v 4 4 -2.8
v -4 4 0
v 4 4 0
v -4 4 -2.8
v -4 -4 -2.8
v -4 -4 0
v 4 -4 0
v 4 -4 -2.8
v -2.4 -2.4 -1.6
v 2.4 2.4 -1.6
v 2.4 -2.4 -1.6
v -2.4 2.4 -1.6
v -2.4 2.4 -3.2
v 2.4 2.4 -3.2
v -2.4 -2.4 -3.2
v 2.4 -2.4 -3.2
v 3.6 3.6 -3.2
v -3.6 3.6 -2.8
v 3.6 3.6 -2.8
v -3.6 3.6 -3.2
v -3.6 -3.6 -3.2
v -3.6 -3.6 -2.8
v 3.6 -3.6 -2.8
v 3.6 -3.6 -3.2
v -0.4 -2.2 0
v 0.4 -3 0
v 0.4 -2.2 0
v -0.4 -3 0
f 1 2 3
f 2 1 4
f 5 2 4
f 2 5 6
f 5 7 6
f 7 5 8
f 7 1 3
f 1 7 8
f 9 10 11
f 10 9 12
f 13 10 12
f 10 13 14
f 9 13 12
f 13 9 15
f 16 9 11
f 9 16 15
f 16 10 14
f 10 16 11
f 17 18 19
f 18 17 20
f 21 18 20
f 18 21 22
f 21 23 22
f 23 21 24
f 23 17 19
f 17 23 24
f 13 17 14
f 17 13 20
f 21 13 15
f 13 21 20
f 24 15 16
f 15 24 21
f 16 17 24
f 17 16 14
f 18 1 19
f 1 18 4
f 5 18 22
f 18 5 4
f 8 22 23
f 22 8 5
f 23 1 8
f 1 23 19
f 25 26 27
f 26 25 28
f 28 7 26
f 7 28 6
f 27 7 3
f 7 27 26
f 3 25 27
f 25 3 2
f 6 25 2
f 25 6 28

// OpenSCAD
// file: ../p/4-4edge.scad
use <../lib.scad>
$fa=1; $fs=0.2;
function ldraw_lib__4_4edge(realsolid=false) = [
// 0 Circle 1.0
// 0 Name: 4-4edge.dat
// 0 Author: James Jessiman
// 0 !LDRAW_ORG Primitive UPDATE 2017-01
// 0 !LICENSE Licensed under CC BY 2.0 and CC BY 4.0 : see CAreadme.txt
// 
// 0 BFC CERTIFY CCW
  [0,"BFC","CERTIFY"],
  [0,"BFC","CCW"],
// 
// 0 !HISTORY 1998-12-15 [PTadmin] Official Update 1998-10
// 0 !HISTORY 2005-12-28 [PTadmin] Official Update 2005-01
// 0 !HISTORY 2007-06-24 [PTadmin] Header formatted for Contributor Agreement
// 0 !HISTORY 2008-07-01 [PTadmin] Official Update 2008-01
// 0 !HISTORY 2017-01-15 [Steffen] BFCed
// 0 !HISTORY 2017-12-30 [PTadmin] Official Update 2017-01
// 
// 
// 2 24 1 0 0 0.9239 0 0.3827
  [2,24,1,0,0,0.9239,0,0.3827],
// 2 24 0.9239 0 0.3827 0.7071 0 0.7071
  [2,24,0.9239,0,0.3827,0.7071,0,0.7071],
// 2 24 0.7071 0 0.7071 0.3827 0 0.9239
  [2,24,0.7071,0,0.7071,0.3827,0,0.9239],
// 2 24 0.3827 0 0.9239 0 0 1
  [2,24,0.3827,0,0.9239,0,0,1],
// 2 24 0 0 1 -0.3827 0 0.9239
  [2,24,0,0,1,-0.3827,0,0.9239],
// 2 24 -0.3827 0 0.9239 -0.7071 0 0.7071
  [2,24,-0.3827,0,0.9239,-0.7071,0,0.7071],
// 2 24 -0.7071 0 0.7071 -0.9239 0 0.3827
  [2,24,-0.7071,0,0.7071,-0.9239,0,0.3827],
// 2 24 -0.9239 0 0.3827 -1 0 -0
  [2,24,-0.9239,0,0.3827,-1,0,-0],
// 2 24 -1 0 -0 -0.9239 0 -0.3827
  [2,24,-1,0,-0,-0.9239,0,-0.3827],
// 2 24 -0.9239 0 -0.3827 -0.7071 0 -0.7071
  [2,24,-0.9239,0,-0.3827,-0.7071,0,-0.7071],
// 2 24 -0.7071 0 -0.7071 -0.3827 0 -0.9239
  [2,24,-0.7071,0,-0.7071,-0.3827,0,-0.9239],
// 2 24 -0.3827 0 -0.9239 0 0 -1
  [2,24,-0.3827,0,-0.9239,0,0,-1],
// 2 24 0 0 -1 0.3827 0 -0.9239
  [2,24,0,0,-1,0.3827,0,-0.9239],
// 2 24 0.3827 0 -0.9239 0.7071 0 -0.7071
  [2,24,0.3827,0,-0.9239,0.7071,0,-0.7071],
// 2 24 0.7071 0 -0.7071 0.9239 0 -0.3827
  [2,24,0.7071,0,-0.7071,0.9239,0,-0.3827],
// 2 24 0.9239 0 -0.3827 1 0 0
  [2,24,0.9239,0,-0.3827,1,0,0],
];
module ldraw_lib__4_4edge(step=0, col=false, unit=2/5, alt=false, line=0.2, solid=!$preview)
    makepoly(ldraw_lib__4_4edge(solid), step=step, col=col, unit=unit, alt=alt, line=line, solid=solid);
ldraw_lib__4_4edge(line=0.2);
// file: ../p/4-4disc.scad
use <../lib.scad>
$fa=1; $fs=0.2;
function ldraw_lib__4_4disc(realsolid=false) = [
// 0 Disc 1.0
// 0 Name: 4-4disc.dat
// 0 Author: James Jessiman
// 0 !LDRAW_ORG Primitive UPDATE 2002-02
// 0 !LICENSE Licensed under CC BY 2.0 and CC BY 4.0 : see CAreadme.txt
// 
// 0 BFC CERTIFY CCW
  [0,"BFC","CERTIFY"],
  [0,"BFC","CCW"],
// 
// 0 !HISTORY 1998-12-15 [PTadmin] Official Update 1998-10
// 0 !HISTORY 2002-03-23 [sbliss] Added BFC statement
// 0 !HISTORY 2002-04-25 [PTadmin] Official Update 2002-02
// 0 !HISTORY 2007-06-24 [PTadmin] Header formatted for Contributor Agreement
// 0 !HISTORY 2008-07-01 [PTadmin] Official Update 2008-01
// 
// 
// 3 16 0 0 0 1 0 0 0.9239 0 0.3827
  [3,16,0,0,0,1,0,0,0.9239,0,0.3827],
// 3 16 0 0 0 0.9239 0 0.3827 0.7071 0 0.7071
  [3,16,0,0,0,0.9239,0,0.3827,0.7071,0,0.7071],
// 3 16 0 0 0 0.7071 0 0.7071 0.3827 0 0.9239
  [3,16,0,0,0,0.7071,0,0.7071,0.3827,0,0.9239],
// 3 16 0 0 0 0.3827 0 0.9239 0 0 1
  [3,16,0,0,0,0.3827,0,0.9239,0,0,1],
// 3 16 0 0 0 0 0 1 -0.3827 0 0.9239
  [3,16,0,0,0,0,0,1,-0.3827,0,0.9239],
// 3 16 0 0 0 -0.3827 0 0.9239 -0.7071 0 0.7071
  [3,16,0,0,0,-0.3827,0,0.9239,-0.7071,0,0.7071],
// 3 16 0 0 0 -0.7071 0 0.7071 -0.9239 0 0.3827
  [3,16,0,0,0,-0.7071,0,0.7071,-0.9239,0,0.3827],
// 3 16 0 0 0 -0.9239 0 0.3827 -1 0 -0
  [3,16,0,0,0,-0.9239,0,0.3827,-1,0,-0],
// 3 16 0 0 0 -1 0 -0 -0.9239 0 -0.3827
  [3,16,0,0,0,-1,0,-0,-0.9239,0,-0.3827],
// 3 16 0 0 0 -0.9239 0 -0.3827 -0.7071 0 -0.7071
  [3,16,0,0,0,-0.9239,0,-0.3827,-0.7071,0,-0.7071],
// 3 16 0 0 0 -0.7071 0 -0.7071 -0.3827 0 -0.9239
  [3,16,0,0,0,-0.7071,0,-0.7071,-0.3827,0,-0.9239],
// 3 16 0 0 0 -0.3827 0 -0.9239 0 0 -1
  [3,16,0,0,0,-0.3827,0,-0.9239,0,0,-1],
// 3 16 0 0 0 0 0 -1 0.3827 0 -0.9239
  [3,16,0,0,0,0,0,-1,0.3827,0,-0.9239],
// 3 16 0 0 0 0.3827 0 -0.9239 0.7071 0 -0.7071
  [3,16,0,0,0,0.3827,0,-0.9239,0.7071,0,-0.7071],
// 3 16 0 0 0 0.7071 0 -0.7071 0.9239 0 -0.3827
  [3,16,0,0,0,0.7071,0,-0.7071,0.9239,0,-0.3827],
// 3 16 0 0 0 0.9239 0 -0.3827 1 0 0
  [3,16,0,0,0,0.9239,0,-0.3827,1,0,0],
// 0
];
module ldraw_lib__4_4disc(step=0, col=false, unit=2/5, alt=false, line=0.2, solid=!$preview)
    makepoly(ldraw_lib__4_4disc(solid), step=step, col=col, unit=unit, alt=alt, line=line, solid=solid);
ldraw_lib__4_4disc(line=0.2);
// file: ../p/4-4cyli.scad
use <../lib.scad>
$fa=1; $fs=0.2;
function ldraw_lib__4_4cyli(realsolid=false) = [
// 0 Cylinder 1.0
// 0 Name: 4-4cyli.dat
// 0 Author: James Jessiman
// 0 !LDRAW_ORG Primitive UPDATE 2005-01
// 0 !LICENSE Licensed under CC BY 2.0 and CC BY 4.0 : see CAreadme.txt
// 
// 0 BFC CERTIFY CCW
  [0,"BFC","CERTIFY"],
  [0,"BFC","CCW"],
// 
// 0 !HISTORY 1998-12-15 [PTadmin] Official Update 1998-10
// 0 !HISTORY 2002-03-23 [sbliss] Added BFC statement; merged headers from files in distributions LDraw 0.27 and Complete.
// 0 !HISTORY 2002-04-25 [PTadmin] Official Update 2002-02
// 0 !HISTORY 2004-12-14 [guyvivan] BFC CCW
// 0 !HISTORY 2005-12-28 [PTadmin] Official Update 2005-01
// 0 !HISTORY 2007-06-24 [PTadmin] Header formatted for Contributor Agreement
// 0 !HISTORY 2008-07-01 [PTadmin] Official Update 2008-01
// 
// 
// 4 16 1 1 0 0.9239 1 0.3827 0.9239 0 0.3827 1 0 0
  [4,16,1,1,0,0.9239,1,0.3827,0.9239,0,0.3827,1,0,0],
// 5 24 1 0 0 1 1 0 0.9239 0 0.3827 0.9239 0 -0.3827
  [5,24,1,0,0,1,1,0,0.9239,0,0.3827,0.9239,0,-0.3827],
// 4 16 0.9239 1 0.3827 0.7071 1 0.7071 0.7071 0 0.7071 0.9239 0 0.3827
  [4,16,0.9239,1,0.3827,0.7071,1,0.7071,0.7071,0,0.7071,0.9239,0,0.3827],
// 5 24 0.9239 0 0.3827 0.9239 1 0.3827 0.7071 0 0.7071 1 0 0
  [5,24,0.9239,0,0.3827,0.9239,1,0.3827,0.7071,0,0.7071,1,0,0],
// 4 16 0.7071 1 0.7071 0.3827 1 0.9239 0.3827 0 0.9239 0.7071 0 0.7071
  [4,16,0.7071,1,0.7071,0.3827,1,0.9239,0.3827,0,0.9239,0.7071,0,0.7071],
// 5 24 0.7071 0 0.7071 0.7071 1 0.7071 0.3827 0 0.9239 0.9239 0 0.3827
  [5,24,0.7071,0,0.7071,0.7071,1,0.7071,0.3827,0,0.9239,0.9239,0,0.3827],
// 4 16 0.3827 1 0.9239 0 1 1 0 0 1 0.3827 0 0.9239
  [4,16,0.3827,1,0.9239,0,1,1,0,0,1,0.3827,0,0.9239],
// 5 24 0.3827 0 0.9239 0.3827 1 0.9239 0 0 1 0.7071 0 0.7071
  [5,24,0.3827,0,0.9239,0.3827,1,0.9239,0,0,1,0.7071,0,0.7071],
// 4 16 0 1 1 -0.3827 1 0.9239 -0.3827 0 0.9239 0 0 1
  [4,16,0,1,1,-0.3827,1,0.9239,-0.3827,0,0.9239,0,0,1],
// 5 24 0 0 1 0 1 1 -0.3827 0 0.9239 0.3827 0 0.9239
  [5,24,0,0,1,0,1,1,-0.3827,0,0.9239,0.3827,0,0.9239],
// 4 16 -0.3827 1 0.9239 -0.7071 1 0.7071 -0.7071 0 0.7071 -0.3827 0 0.9239
  [4,16,-0.3827,1,0.9239,-0.7071,1,0.7071,-0.7071,0,0.7071,-0.3827,0,0.9239],
// 5 24 -0.3827 0 0.9239 -0.3827 1 0.9239 -0.7071 0 0.7071 0 0 1
  [5,24,-0.3827,0,0.9239,-0.3827,1,0.9239,-0.7071,0,0.7071,0,0,1],
// 4 16 -0.7071 1 0.7071 -0.9239 1 0.3827 -0.9239 0 0.3827 -0.7071 0 0.7071
  [4,16,-0.7071,1,0.7071,-0.9239,1,0.3827,-0.9239,0,0.3827,-0.7071,0,0.7071],
// 5 24 -0.7071 0 0.7071 -0.7071 1 0.7071 -0.9239 0 0.3827 -0.3827 0 0.9239
  [5,24,-0.7071,0,0.7071,-0.7071,1,0.7071,-0.9239,0,0.3827,-0.3827,0,0.9239],
// 4 16 -0.9239 1 0.3827 -1 1 0 -1 0 0 -0.9239 0 0.3827
  [4,16,-0.9239,1,0.3827,-1,1,0,-1,0,0,-0.9239,0,0.3827],
// 5 24 -0.9239 0 0.3827 -0.9239 1 0.3827 -1 0 0 -0.7071 0 0.7071
  [5,24,-0.9239,0,0.3827,-0.9239,1,0.3827,-1,0,0,-0.7071,0,0.7071],
// 4 16 -1 1 0 -0.9239 1 -0.3827 -0.9239 0 -0.3827 -1 0 0
  [4,16,-1,1,0,-0.9239,1,-0.3827,-0.9239,0,-0.3827,-1,0,0],
// 5 24 -1 0 0 -1 1 0 -0.9239 0 -0.3827 -0.9239 0 0.3827
  [5,24,-1,0,0,-1,1,0,-0.9239,0,-0.3827,-0.9239,0,0.3827],
// 4 16 -0.9239 1 -0.3827 -0.7071 1 -0.7071 -0.7071 0 -0.7071 -0.9239 0 -0.3827
  [4,16,-0.9239,1,-0.3827,-0.7071,1,-0.7071,-0.7071,0,-0.7071,-0.9239,0,-0.3827],
// 5 24 -0.9239 0 -0.3827 -0.9239 1 -0.3827 -0.7071 0 -0.7071 -1 0 0
  [5,24,-0.9239,0,-0.3827,-0.9239,1,-0.3827,-0.7071,0,-0.7071,-1,0,0],
// 4 16 -0.7071 1 -0.7071 -0.3827 1 -0.9239 -0.3827 0 -0.9239 -0.7071 0 -0.7071
  [4,16,-0.7071,1,-0.7071,-0.3827,1,-0.9239,-0.3827,0,-0.9239,-0.7071,0,-0.7071],
// 5 24 -0.7071 0 -0.7071 -0.7071 1 -0.7071 -0.3827 0 -0.9239 -0.9239 0 -0.3827
  [5,24,-0.7071,0,-0.7071,-0.7071,1,-0.7071,-0.3827,0,-0.9239,-0.9239,0,-0.3827],
// 4 16 -0.3827 1 -0.9239 0 1 -1 0 0 -1 -0.3827 0 -0.9239
  [4,16,-0.3827,1,-0.9239,0,1,-1,0,0,-1,-0.3827,0,-0.9239],
// 5 24 -0.3827 0 -0.9239 -0.3827 1 -0.9239 0 0 -1 -0.7071 0 -0.7071
  [5,24,-0.3827,0,-0.9239,-0.3827,1,-0.9239,0,0,-1,-0.7071,0,-0.7071],
// 4 16 0 1 -1 0.3827 1 -0.9239 0.3827 0 -0.9239 0 0 -1
  [4,16,0,1,-1,0.3827,1,-0.9239,0.3827,0,-0.9239,0,0,-1],
// 5 24 0 0 -1 0 1 -1 0.3827 0 -0.9239 -0.3827 0 -0.9239
  [5,24,0,0,-1,0,1,-1,0.3827,0,-0.9239,-0.3827,0,-0.9239],
// 4 16 0.3827 1 -0.9239 0.7071 1 -0.7071 0.7071 0 -0.7071 0.3827 0 -0.9239
  [4,16,0.3827,1,-0.9239,0.7071,1,-0.7071,0.7071,0,-0.7071,0.3827,0,-0.9239],
// 5 24 0.3827 0 -0.9239 0.3827 1 -0.9239 0.7071 0 -0.7071 0 0 -1
  [5,24,0.3827,0,-0.9239,0.3827,1,-0.9239,0.7071,0,-0.7071,0,0,-1],
// 4 16 0.7071 1 -0.7071 0.9239 1 -0.3827 0.9239 0 -0.3827 0.7071 0 -0.7071
  [4,16,0.7071,1,-0.7071,0.9239,1,-0.3827,0.9239,0,-0.3827,0.7071,0,-0.7071],
// 5 24 0.7071 0 -0.7071 0.7071 1 -0.7071 0.9239 0 -0.3827 0.3827 0 -0.9239
  [5,24,0.7071,0,-0.7071,0.7071,1,-0.7071,0.9239,0,-0.3827,0.3827,0,-0.9239],
// 4 16 0.9239 1 -0.3827 1 1 0 1 0 0 0.9239 0 -0.3827
  [4,16,0.9239,1,-0.3827,1,1,0,1,0,0,0.9239,0,-0.3827],
// 5 24 0.9239 0 -0.3827 0.9239 1 -0.3827 1 0 0 0.7071 0 -0.7071
  [5,24,0.9239,0,-0.3827,0.9239,1,-0.3827,1,0,0,0.7071,0,-0.7071],
// 0
];
module ldraw_lib__4_4cyli(step=0, col=false, unit=2/5, alt=false, line=0.2, solid=!$preview)
    makepoly(ldraw_lib__4_4cyli(solid), step=step, col=col, unit=unit, alt=alt, line=line, solid=solid);
ldraw_lib__4_4cyli(line=0.2);
// file: ../p/stud3.scad
use <../lib.scad>
use <4-4cyli.scad>
use <4-4disc.scad>
use <4-4edge.scad>
$fa=1; $fs=0.2;
function ldraw_lib__stud3(realsolid=false) = realsolid ? 
    [openscad(translate([0,0,-eps()], o=cylinder(4+eps(), r=4)),2)] : [
// 0 Stud Tube Solid
// 0 Name: stud3.dat
// 0 Author: James Jessiman
// 0 !LDRAW_ORG Primitive UPDATE 2012-01
// 0 !LICENSE Licensed under CC BY 2.0 and CC BY 4.0 : see CAreadme.txt
// 
// 0 BFC CERTIFY CCW
  [0,"BFC","CERTIFY"],
  [0,"BFC","CCW"],
// 
// 0 !HISTORY 2002-04-04 [sbliss] Modified for BFC compliance
// 0 !HISTORY 2002-04-25 [PTadmin] Official Update 2002-02
// 0 !HISTORY 2007-06-24 [PTadmin] Header formatted for Contributor Agreement
// 0 !HISTORY 2008-07-01 [PTadmin] Official Update 2008-01
// 0 !HISTORY 2012-02-16 [Philo] Changed to CCW
// 0 !HISTORY 2012-03-30 [PTadmin] Official Update 2012-01
// 
// 
// 1 16 0 -4 0 4 0 0 0 1 0 0 0 4 4-4edge.dat
  [1,16,0,-4,0,4,0,0,0,1,0,0,0,4, ldraw_lib__4_4edge(realsolid)],
// 1 16 0 0 0 4 0 0 0 1 0 0 0 4 4-4edge.dat
  [1,16,0,0,0,4,0,0,0,1,0,0,0,4, ldraw_lib__4_4edge(realsolid)],
// 1 16 0 -4 0 4 0 0 0 1 0 0 0 4 4-4disc.dat
  [1,16,0,-4,0,4,0,0,0,1,0,0,0,4, ldraw_lib__4_4disc(realsolid)],
// 1 16 0 -4 0 4 0 0 0 4 0 0 0 4 4-4cyli.dat
  [1,16,0,-4,0,4,0,0,0,4,0,0,0,4, ldraw_lib__4_4cyli(realsolid)],
];
module ldraw_lib__stud3(step=0, col=false, unit=2/5, alt=false, line=0.2, solid=!$preview)
    makepoly(ldraw_lib__stud3(solid), step=step, col=col, unit=unit, alt=alt, line=line, solid=solid);
ldraw_lib__stud3(line=0.2);
// file: ../p/stud.scad
use <../lib.scad>
use <4-4cyli.scad>
use <4-4disc.scad>
use <4-4edge.scad>
$fa=1; $fs=0.2;
function ldraw_lib__stud(realsolid=false) = realsolid ? 
    [openscad(translate([0,0,-eps()], o=cylinder(4+eps(), r=6)),2)] : [
// 0 Stud
// 0 Name: stud.dat
// 0 Author: James Jessiman
// 0 !LDRAW_ORG Primitive UPDATE 2012-01
// 0 !LICENSE Licensed under CC BY 2.0 and CC BY 4.0 : see CAreadme.txt
// 
// 0 BFC CERTIFY CCW
  [0,"BFC","CERTIFY"],
  [0,"BFC","CCW"],
// 
// 0 !HISTORY 2002-04-04 [sbliss] Modified for BFC compliance
// 0 !HISTORY 2002-04-25 [PTadmin] Official Update 2002-02
// 0 !HISTORY 2007-06-24 [PTadmin] Header formatted for Contributor Agreement
// 0 !HISTORY 2008-07-01 [PTadmin] Official Update 2008-01
// 0 !HISTORY 2012-02-16 [Philo] Changed to CCW
// 0 !HISTORY 2012-03-30 [PTadmin] Official Update 2012-01
// 
// 
// 1 16 0 0 0 6 0 0 0 1 0 0 0 6 4-4edge.dat
  [1,16,0,0,0,6,0,0,0,1,0,0,0,6, ldraw_lib__4_4edge(realsolid)],
// 1 16 0 -4 0 6 0 0 0 1 0 0 0 6 4-4edge.dat
  [1,16,0,-4,0,6,0,0,0,1,0,0,0,6, ldraw_lib__4_4edge(realsolid)],
// 1 16 0 0 0 6 0 0 0 -4 0 0 0 6 4-4cyli.dat
  [1,16,0,0,0,6,0,0,0,-4,0,0,0,6, ldraw_lib__4_4cyli(realsolid)],
// 1 16 0 -4 0 6 0 0 0 1 0 0 0 6 4-4disc.dat
  [1,16,0,-4,0,6,0,0,0,1,0,0,0,6, ldraw_lib__4_4disc(realsolid)],
];
module ldraw_lib__stud(step=0, col=false, unit=2/5, alt=false, line=0.2, solid=!$preview)
    makepoly(ldraw_lib__stud(solid), step=step, col=col, unit=unit, alt=alt, line=line, solid=solid);
ldraw_lib__stud(line=0.2);
// file: ../p/box4t.scad
use <../lib.scad>
$fa=1; $fs=0.2;
function ldraw_lib__box4t(realsolid=false) = [
// 0 Box with 4 Adjacent Faces and All Edges
// 0 Name: box4t.dat
// 0 Author: Tore Eriksson [Tore_Eriksson]
// 0 !LDRAW_ORG Primitive UPDATE 2003-02
// 0 !LICENSE Licensed under CC BY 2.0 and CC BY 4.0 : see CAreadme.txt
// 
// 0 BFC CERTIFY CCW
  [0,"BFC","CERTIFY"],
  [0,"BFC","CCW"],
// 
// 0 !HISTORY 1997-09-29 [PTadmin] Official Update 1997-15
// 0 !HISTORY 2002-08-31 [izanette] Modified with WINDZ for BFC compliance
// 0 !HISTORY 2003-08-01 [PTadmin] Official Update 2003-02
// 0 !HISTORY 2007-06-24 [PTadmin] Header formatted for Contributor Agreement
// 0 !HISTORY 2008-07-01 [PTadmin] Official Update 2008-01
// 
// 
// 2 24 1 1 1 -1 1 1
  [2,24,1,1,1,-1,1,1],
// 2 24 -1 1 1 -1 1 -1
  [2,24,-1,1,1,-1,1,-1],
// 2 24 -1 1 -1 1 1 -1
  [2,24,-1,1,-1,1,1,-1],
// 2 24 1 1 -1 1 1 1
  [2,24,1,1,-1,1,1,1],
// 2 24 1 0 1 -1 0 1
  [2,24,1,0,1,-1,0,1],
// 2 24 -1 0 1 -1 0 -1
  [2,24,-1,0,1,-1,0,-1],
// 2 24 -1 0 -1 1 0 -1
  [2,24,-1,0,-1,1,0,-1],
// 2 24 1 0 -1 1 0 1
  [2,24,1,0,-1,1,0,1],
// 2 24 1 0 1 1 1 1
  [2,24,1,0,1,1,1,1],
// 2 24 -1 0 1 -1 1 1
  [2,24,-1,0,1,-1,1,1],
// 2 24 1 0 -1 1 1 -1
  [2,24,1,0,-1,1,1,-1],
// 2 24 -1 0 -1 -1 1 -1
  [2,24,-1,0,-1,-1,1,-1],
// 4 16 1 1 1 1 1 -1 -1 1 -1 -1 1 1
  [4,16,1,1,1,1,1,-1,-1,1,-1,-1,1,1],
// 4 16 1 1 1 -1 1 1 -1 0 1 1 0 1
  [4,16,1,1,1,-1,1,1,-1,0,1,1,0,1],
// 4 16 -1 1 1 -1 1 -1 -1 0 -1 -1 0 1
  [4,16,-1,1,1,-1,1,-1,-1,0,-1,-1,0,1],
// 0 4 16 -1 1 -1 -1 0 -1 1 0 -1 1 1 -1
// 4 16 1 1 -1 1 1 1 1 0 1 1 0 -1
  [4,16,1,1,-1,1,1,1,1,0,1,1,0,-1],
// 0
];
module ldraw_lib__box4t(step=0, col=false, unit=2/5, alt=false, line=0.2, solid=!$preview)
    makepoly(ldraw_lib__box4t(solid), step=step, col=col, unit=unit, alt=alt, line=line, solid=solid);
ldraw_lib__box4t(line=0.2);
// file: s/3004s01.scad
use <../../lib.scad>
use <../../p/box4t.scad>
use <../../p/box5.scad>
use <../../p/stud.scad>
use <../../p/stud3.scad>
$fa=1; $fs=0.2;
function ldraw_lib__s__3004s01(realsolid=false) = [
// 0 ~Brick  1 x  2 without Front Face
// 0 Name: s\3004s01.dat
// 0 Author: James Jessiman
// 0 !LDRAW_ORG Subpart UPDATE 2003-03
// 0 !LICENSE Licensed under CC BY 2.0 and CC BY 4.0 : see CAreadme.txt
// 
// 0 BFC CERTIFY CCW
  [0,"BFC","CERTIFY"],
  [0,"BFC","CCW"],
// 
// 0 !HISTORY 2003-09-07 [jriley] Subfiling, BFC
// 0 !HISTORY 2003-12-19 [PTadmin] Official Update 2003-03
// 0 !HISTORY 2007-08-29 [PTadmin] Header formatted for Contributor Agreement
// 0 !HISTORY 2008-07-01 [PTadmin] Official Update 2008-01
// 
// 
// 1 16 0 4 0 1 0 0 0 -5 0 0 0 1 stud3.dat
  [1,16,0,4,0,1,0,0,0,-5,0,0,0,1, ldraw_lib__stud3(realsolid)],
// 0 BFC INVERTNEXT
  [0,"BFC","INVERTNEXT"],
// 1 16 0 24 0 16 0 0 0 -20 0 0 0 6 box5.dat
  [1,16,0,24,0,16,0,0,0,-20,0,0,0,6, ldraw_lib__box5(realsolid)],
// 4 16 20 24 10 16 24 6 -16 24 6 -20 24 10
  [4,16,20,24,10,16,24,6,-16,24,6,-20,24,10],
// 4 16 -20 24 10 -16 24 6 -16 24 -6 -20 24 -10
  [4,16,-20,24,10,-16,24,6,-16,24,-6,-20,24,-10],
// 4 16 -20 24 -10 -16 24 -6 16 24 -6 20 24 -10
  [4,16,-20,24,-10,-16,24,-6,16,24,-6,20,24,-10],
// 4 16 20 24 -10 16 24 -6 16 24 6 20 24 10
  [4,16,20,24,-10,16,24,-6,16,24,6,20,24,10],
// 1 16 0 24 0 20 0 0 0 -24 0 0 0 10 box4t.dat
  [1,16,0,24,0,20,0,0,0,-24,0,0,0,10, ldraw_lib__box4t(realsolid)],
// 1 16 10 0 0 1 0 0 0 1 0 0 0 1 stud.dat
  [1,16,10,0,0,1,0,0,0,1,0,0,0,1, ldraw_lib__stud(realsolid)],
// 1 16 -10 0 0 1 0 0 0 1 0 0 0 1 stud.dat
  [1,16,-10,0,0,1,0,0,0,1,0,0,0,1, ldraw_lib__stud(realsolid)],
// 0
];
module ldraw_lib__s__3004s01(step=0, col=false, unit=2/5, alt=false, line=0.2, solid=!$preview)
    makepoly(ldraw_lib__s__3004s01(solid), step=step, col=col, unit=unit, alt=alt, line=line, solid=solid);
ldraw_lib__s__3004s01(line=0.2);
// file: ../p/box5.scad
use <../lib.scad>
$fa=1; $fs=0.2;
function ldraw_lib__box5(realsolid=false) = [
// 0 Box with 5 Faces and All Edges
// 0 Name: box5.dat
// 0 Author: James Jessiman
// 0 !LDRAW_ORG Primitive UPDATE 2012-01
// 0 !LICENSE Licensed under CC BY 2.0 and CC BY 4.0 : see CAreadme.txt
// 
// 0 BFC CERTIFY CCW
  [0,"BFC","CERTIFY"],
  [0,"BFC","CCW"],
// 
// 0 !HISTORY 2002-04-03 [sbliss] Modified for BFC compliance
// 0 !HISTORY 2002-04-25 [PTadmin] Official Update 2002-02
// 0 !HISTORY 2007-06-24 [PTadmin] Header formatted for Contributor Agreement
// 0 !HISTORY 2008-07-01 [PTadmin] Official Update 2008-01
// 0 !HISTORY 2012-02-16 [Philo] Changed to CCW
// 0 !HISTORY 2012-03-30 [PTadmin] Official Update 2012-01
// 
// 
// 2 24 1 1 1 -1 1 1
  [2,24,1,1,1,-1,1,1],
// 2 24 -1 1 1 -1 1 -1
  [2,24,-1,1,1,-1,1,-1],
// 2 24 -1 1 -1 1 1 -1
  [2,24,-1,1,-1,1,1,-1],
// 2 24 1 1 -1 1 1 1
  [2,24,1,1,-1,1,1,1],
// 2 24 1 0 1 -1 0 1
  [2,24,1,0,1,-1,0,1],
// 2 24 -1 0 1 -1 0 -1
  [2,24,-1,0,1,-1,0,-1],
// 2 24 -1 0 -1 1 0 -1
  [2,24,-1,0,-1,1,0,-1],
// 2 24 1 0 -1 1 0 1
  [2,24,1,0,-1,1,0,1],
// 2 24 1 0 1 1 1 1
  [2,24,1,0,1,1,1,1],
// 2 24 -1 0 1 -1 1 1
  [2,24,-1,0,1,-1,1,1],
// 2 24 1 0 -1 1 1 -1
  [2,24,1,0,-1,1,1,-1],
// 2 24 -1 0 -1 -1 1 -1
  [2,24,-1,0,-1,-1,1,-1],
// 4 16 -1 1 1 1 1 1 1 1 -1 -1 1 -1
  [4,16,-1,1,1,1,1,1,1,1,-1,-1,1,-1],
// 4 16 -1 1 1 -1 0 1 1 0 1 1 1 1
  [4,16,-1,1,1,-1,0,1,1,0,1,1,1,1],
// 4 16 -1 1 -1 -1 0 -1 -1 0 1 -1 1 1
  [4,16,-1,1,-1,-1,0,-1,-1,0,1,-1,1,1],
// 4 16 1 1 -1 1 0 -1 -1 0 -1 -1 1 -1
  [4,16,1,1,-1,1,0,-1,-1,0,-1,-1,1,-1],
// 4 16 1 1 1 1 0 1 1 0 -1 1 1 -1
  [4,16,1,1,1,1,0,1,1,0,-1,1,1,-1],
];
module ldraw_lib__box5(step=0, col=false, unit=2/5, alt=false, line=0.2, solid=!$preview)
    makepoly(ldraw_lib__box5(solid), step=step, col=col, unit=unit, alt=alt, line=line, solid=solid);
ldraw_lib__box5(line=0.2);
// file: ../p/box4.scad
use <../lib.scad>
$fa=1; $fs=0.2;
function ldraw_lib__box4(realsolid=false) = [
// 0 Box with 4 Faces (2 Parallel Pairs) and All Edges
// 0 Name: box4.dat
// 0 Author: James Jessiman
// 0 !LDRAW_ORG Primitive UPDATE 2012-01
// 0 !LICENSE Licensed under CC BY 2.0 and CC BY 4.0 : see CAreadme.txt
// 
// 0 BFC CERTIFY CCW
  [0,"BFC","CERTIFY"],
  [0,"BFC","CCW"],
// 
// 0 !HISTORY 2002-04-03 [sbliss] Modified for BFC compliance
// 0 !HISTORY 2002-04-25 [PTadmin] Official Update 2002-02
// 0 !HISTORY 2007-06-24 [PTadmin] Header formatted for Contributor Agreement
// 0 !HISTORY 2008-07-01 [PTadmin] Official Update 2008-01
// 0 !HISTORY 2012-02-16 [Philo] Changed to CCW
// 0 !HISTORY 2012-03-30 [PTadmin] Official Update 2012-01
// 
// 
// 2 24 1 1 1 -1 1 1
  [2,24,1,1,1,-1,1,1],
// 2 24 -1 1 1 -1 1 -1
  [2,24,-1,1,1,-1,1,-1],
// 2 24 -1 1 -1 1 1 -1
  [2,24,-1,1,-1,1,1,-1],
// 2 24 1 1 -1 1 1 1
  [2,24,1,1,-1,1,1,1],
// 2 24 1 0 1 -1 0 1
  [2,24,1,0,1,-1,0,1],
// 2 24 -1 0 1 -1 0 -1
  [2,24,-1,0,1,-1,0,-1],
// 2 24 -1 0 -1 1 0 -1
  [2,24,-1,0,-1,1,0,-1],
// 2 24 1 0 -1 1 0 1
  [2,24,1,0,-1,1,0,1],
// 2 24 1 0 1 1 1 1
  [2,24,1,0,1,1,1,1],
// 2 24 -1 0 1 -1 1 1
  [2,24,-1,0,1,-1,1,1],
// 2 24 1 0 -1 1 1 -1
  [2,24,1,0,-1,1,1,-1],
// 2 24 -1 0 -1 -1 1 -1
  [2,24,-1,0,-1,-1,1,-1],
// 4 16 -1 1 1 -1 0 1 1 0 1 1 1 1
  [4,16,-1,1,1,-1,0,1,1,0,1,1,1,1],
// 4 16 -1 1 -1 -1 0 -1 -1 0 1 -1 1 1
  [4,16,-1,1,-1,-1,0,-1,-1,0,1,-1,1,1],
// 4 16 1 1 -1 1 0 -1 -1 0 -1 -1 1 -1
  [4,16,1,1,-1,1,0,-1,-1,0,-1,-1,1,-1],
// 4 16 1 1 1 1 0 1 1 0 -1 1 1 -1
  [4,16,1,1,1,1,0,1,1,0,-1,1,1,-1],
];
module ldraw_lib__box4(step=0, col=false, unit=2/5, alt=false, line=0.2, solid=!$preview)
    makepoly(ldraw_lib__box4(solid), step=step, col=col, unit=unit, alt=alt, line=line, solid=solid);
ldraw_lib__box4(line=0.2);
// file: 3004.scad
use <../lib.scad>
use <s/3004s01.scad>
$fa=1; $fs=0.2;
function ldraw_lib__3004(realsolid=false) = [
// 0 Brick  1 x  2
// 0 Name: 3004.dat
// 0 Author: James Jessiman
// 0 !LDRAW_ORG Part UPDATE 2022-05
// 0 !LICENSE Licensed under CC BY 2.0 and CC BY 4.0 : see CAreadme.txt
// 
// 0 BFC CERTIFY CCW
  [0,"BFC","CERTIFY"],
  [0,"BFC","CCW"],
// 
// 0 !HISTORY 2001-10-26 [PTadmin] Official Update 2001-01
// 0 !HISTORY 2002-05-07 {unknown} BFC Certification
// 0 !HISTORY 2002-06-11 [PTadmin] Official Update 2002-03
// 0 !HISTORY 2007-05-07 [PTadmin] Header formatted for Contributor Agreement
// 0 !HISTORY 2008-07-01 [PTadmin] Official Update 2008-01
// 0 !HISTORY 2022-08-04 [MagFors] Using subfile
// 0 !HISTORY 2022-09-15 [PTadmin] Official Update 2022-05
// 
// 
// 1 16 0 0 0 1 0 0 0 1 0 0 0 1 s\3004s01.dat
  [1,16,0,0,0,1,0,0,0,1,0,0,0,1, ldraw_lib__s__3004s01(realsolid)],
// 4 16 -20 24 -10 20 24 -10 20 0 -10 -20 0 -10
  [4,16,-20,24,-10,20,24,-10,20,0,-10,-20,0,-10],
];
module ldraw_lib__3004(step=0, col=false, unit=2/5, alt=false, line=0.2, solid=!$preview)
    makepoly(ldraw_lib__3004(solid), step=step, col=col, unit=unit, alt=alt, line=line, solid=solid);
ldraw_lib__3004(line=0.2);
// file: s/3070bs01.scad
use <../../lib.scad>
use <../../p/box4.scad>
use <../../p/box5.scad>
$fa=1; $fs=0.2;
function ldraw_lib__s__3070bs01(realsolid=false) = [
// 0 ~Tile  1 x  1 with Groove without Top Face
// 0 Name: s\3070bs01.dat
// 0 Author: Chris Dee [cwdee]
// 0 !LDRAW_ORG Subpart UPDATE 2009-02
// 0 !LICENSE Licensed under CC BY 2.0 and CC BY 4.0 : see CAreadme.txt
// 
// 0 BFC CERTIFY CCW
  [0,"BFC","CERTIFY"],
  [0,"BFC","CCW"],
// 
// 0 !HISTORY 2009-09-03 [PTadmin] Official Update 2009-02
// 
// 
// 1 16 0 0 0 10 0 0 0 7 0 0 0 10 box4.dat
  [1,16,0,0,0,10,0,0,0,7,0,0,0,10, ldraw_lib__box4(realsolid)],
// 0 BFC INVERTNEXT
  [0,"BFC","INVERTNEXT"],
// 1 16 0 8 0 6 0 0 0 -4 0 0 0 6 box5.dat
  [1,16,0,8,0,6,0,0,0,-4,0,0,0,6, ldraw_lib__box5(realsolid)],
// 1 16 0 7 0 9 0 0 0 1 0 0 0 9 box4.dat
  [1,16,0,7,0,9,0,0,0,1,0,0,0,9, ldraw_lib__box4(realsolid)],
// 
// 4 16 9 8 9 6 8 6 -6 8 6 -9 8 9
  [4,16,9,8,9,6,8,6,-6,8,6,-9,8,9],
// 4 16 -9 8 9 -6 8 6 -6 8 -6 -9 8 -9
  [4,16,-9,8,9,-6,8,6,-6,8,-6,-9,8,-9],
// 4 16 -9 8 -9 -6 8 -6 6 8 -6 9 8 -9
  [4,16,-9,8,-9,-6,8,-6,6,8,-6,9,8,-9],
// 4 16 9 8 -9 6 8 -6 6 8 6 9 8 9
  [4,16,9,8,-9,6,8,-6,6,8,6,9,8,9],
// 
// 4 16 10 7 10 9 7 9 -9 7 9 -10 7 10
  [4,16,10,7,10,9,7,9,-9,7,9,-10,7,10],
// 4 16 -10 7 10 -9 7 9 -9 7 -9 -10 7 -10
  [4,16,-10,7,10,-9,7,9,-9,7,-9,-10,7,-10],
// 4 16 -10 7 -10 -9 7 -9 9 7 -9 10 7 -10
  [4,16,-10,7,-10,-9,7,-9,9,7,-9,10,7,-10],
// 4 16 10 7 -10 9 7 -9 9 7 9 10 7 10
  [4,16,10,7,-10,9,7,-9,9,7,9,10,7,10],
// 0
];
module ldraw_lib__s__3070bs01(step=0, col=false, unit=2/5, alt=false, line=0.2, solid=!$preview)
    makepoly(ldraw_lib__s__3070bs01(solid), step=step, col=col, unit=unit, alt=alt, line=line, solid=solid);
ldraw_lib__s__3070bs01(line=0.2);
// main file
use <../lib.scad>
use <s/3070bs01.scad>
$fa=1; $fs=0.2;
function ldraw_lib__3070bpuf(realsolid=false) = [
// 0 Tile  1 x  1 with Silver "." Pattern
// 0 Name: 3070bpuf.dat
// 0 Author: Magnus Forsberg [MagFors]
// 0 !LDRAW_ORG Part UPDATE 2015-02
// 0 !LICENSE Licensed under CC BY 2.0 and CC BY 4.0 : see CAreadme.txt
// 
// 0 BFC CERTIFY CCW
  [0,"BFC","CERTIFY"],
  [0,"BFC","CCW"],
// 
// 0 !KEYWORDS dot, period, point
// 
// 0 !HISTORY 2015-12-30 [PTadmin] Official Update 2015-02
// 
// 
// 1 16 0 0 0 1 0 0 0 1 0 0 0 1 s\3070bs01.dat
  [1,16,0,0,0,1,0,0,0,1,0,0,0,1, ldraw_lib__s__3070bs01(realsolid)],
// 
// 4 80 1 0 -5.5 -1 0 -5.5 -1 0 -7.5 1 0 -7.5
  [4,80,1,0,-5.5,-1,0,-5.5,-1,0,-7.5,1,0,-7.5],
// 
// 4 16 -1 0 -7.5 -10 0 -10 10 0 -10 1 0 -7.5
  [4,16,-1,0,-7.5,-10,0,-10,10,0,-10,1,0,-7.5],
// 4 16 1 0 -5.5 1 0 -7.5 10 0 -10 10 0 10
  [4,16,1,0,-5.5,1,0,-7.5,10,0,-10,10,0,10],
// 4 16 -10 0 10 -1 0 -5.5 1 0 -5.5 10 0 10
  [4,16,-10,0,10,-1,0,-5.5,1,0,-5.5,10,0,10],
// 4 16 -10 0 -10 -1 0 -7.5 -1 0 -5.5 -10 0 10
  [4,16,-10,0,-10,-1,0,-7.5,-1,0,-5.5,-10,0,10],
];
module ldraw_lib__3070bpuf(step=0, col=false, unit=2/5, alt=false, line=0.2, solid=!$preview)
    makepoly(ldraw_lib__3070bpuf(solid), step=step, col=col, unit=unit, alt=alt, line=line, solid=solid);
ldraw_lib__3070bpuf(line=0.2);
